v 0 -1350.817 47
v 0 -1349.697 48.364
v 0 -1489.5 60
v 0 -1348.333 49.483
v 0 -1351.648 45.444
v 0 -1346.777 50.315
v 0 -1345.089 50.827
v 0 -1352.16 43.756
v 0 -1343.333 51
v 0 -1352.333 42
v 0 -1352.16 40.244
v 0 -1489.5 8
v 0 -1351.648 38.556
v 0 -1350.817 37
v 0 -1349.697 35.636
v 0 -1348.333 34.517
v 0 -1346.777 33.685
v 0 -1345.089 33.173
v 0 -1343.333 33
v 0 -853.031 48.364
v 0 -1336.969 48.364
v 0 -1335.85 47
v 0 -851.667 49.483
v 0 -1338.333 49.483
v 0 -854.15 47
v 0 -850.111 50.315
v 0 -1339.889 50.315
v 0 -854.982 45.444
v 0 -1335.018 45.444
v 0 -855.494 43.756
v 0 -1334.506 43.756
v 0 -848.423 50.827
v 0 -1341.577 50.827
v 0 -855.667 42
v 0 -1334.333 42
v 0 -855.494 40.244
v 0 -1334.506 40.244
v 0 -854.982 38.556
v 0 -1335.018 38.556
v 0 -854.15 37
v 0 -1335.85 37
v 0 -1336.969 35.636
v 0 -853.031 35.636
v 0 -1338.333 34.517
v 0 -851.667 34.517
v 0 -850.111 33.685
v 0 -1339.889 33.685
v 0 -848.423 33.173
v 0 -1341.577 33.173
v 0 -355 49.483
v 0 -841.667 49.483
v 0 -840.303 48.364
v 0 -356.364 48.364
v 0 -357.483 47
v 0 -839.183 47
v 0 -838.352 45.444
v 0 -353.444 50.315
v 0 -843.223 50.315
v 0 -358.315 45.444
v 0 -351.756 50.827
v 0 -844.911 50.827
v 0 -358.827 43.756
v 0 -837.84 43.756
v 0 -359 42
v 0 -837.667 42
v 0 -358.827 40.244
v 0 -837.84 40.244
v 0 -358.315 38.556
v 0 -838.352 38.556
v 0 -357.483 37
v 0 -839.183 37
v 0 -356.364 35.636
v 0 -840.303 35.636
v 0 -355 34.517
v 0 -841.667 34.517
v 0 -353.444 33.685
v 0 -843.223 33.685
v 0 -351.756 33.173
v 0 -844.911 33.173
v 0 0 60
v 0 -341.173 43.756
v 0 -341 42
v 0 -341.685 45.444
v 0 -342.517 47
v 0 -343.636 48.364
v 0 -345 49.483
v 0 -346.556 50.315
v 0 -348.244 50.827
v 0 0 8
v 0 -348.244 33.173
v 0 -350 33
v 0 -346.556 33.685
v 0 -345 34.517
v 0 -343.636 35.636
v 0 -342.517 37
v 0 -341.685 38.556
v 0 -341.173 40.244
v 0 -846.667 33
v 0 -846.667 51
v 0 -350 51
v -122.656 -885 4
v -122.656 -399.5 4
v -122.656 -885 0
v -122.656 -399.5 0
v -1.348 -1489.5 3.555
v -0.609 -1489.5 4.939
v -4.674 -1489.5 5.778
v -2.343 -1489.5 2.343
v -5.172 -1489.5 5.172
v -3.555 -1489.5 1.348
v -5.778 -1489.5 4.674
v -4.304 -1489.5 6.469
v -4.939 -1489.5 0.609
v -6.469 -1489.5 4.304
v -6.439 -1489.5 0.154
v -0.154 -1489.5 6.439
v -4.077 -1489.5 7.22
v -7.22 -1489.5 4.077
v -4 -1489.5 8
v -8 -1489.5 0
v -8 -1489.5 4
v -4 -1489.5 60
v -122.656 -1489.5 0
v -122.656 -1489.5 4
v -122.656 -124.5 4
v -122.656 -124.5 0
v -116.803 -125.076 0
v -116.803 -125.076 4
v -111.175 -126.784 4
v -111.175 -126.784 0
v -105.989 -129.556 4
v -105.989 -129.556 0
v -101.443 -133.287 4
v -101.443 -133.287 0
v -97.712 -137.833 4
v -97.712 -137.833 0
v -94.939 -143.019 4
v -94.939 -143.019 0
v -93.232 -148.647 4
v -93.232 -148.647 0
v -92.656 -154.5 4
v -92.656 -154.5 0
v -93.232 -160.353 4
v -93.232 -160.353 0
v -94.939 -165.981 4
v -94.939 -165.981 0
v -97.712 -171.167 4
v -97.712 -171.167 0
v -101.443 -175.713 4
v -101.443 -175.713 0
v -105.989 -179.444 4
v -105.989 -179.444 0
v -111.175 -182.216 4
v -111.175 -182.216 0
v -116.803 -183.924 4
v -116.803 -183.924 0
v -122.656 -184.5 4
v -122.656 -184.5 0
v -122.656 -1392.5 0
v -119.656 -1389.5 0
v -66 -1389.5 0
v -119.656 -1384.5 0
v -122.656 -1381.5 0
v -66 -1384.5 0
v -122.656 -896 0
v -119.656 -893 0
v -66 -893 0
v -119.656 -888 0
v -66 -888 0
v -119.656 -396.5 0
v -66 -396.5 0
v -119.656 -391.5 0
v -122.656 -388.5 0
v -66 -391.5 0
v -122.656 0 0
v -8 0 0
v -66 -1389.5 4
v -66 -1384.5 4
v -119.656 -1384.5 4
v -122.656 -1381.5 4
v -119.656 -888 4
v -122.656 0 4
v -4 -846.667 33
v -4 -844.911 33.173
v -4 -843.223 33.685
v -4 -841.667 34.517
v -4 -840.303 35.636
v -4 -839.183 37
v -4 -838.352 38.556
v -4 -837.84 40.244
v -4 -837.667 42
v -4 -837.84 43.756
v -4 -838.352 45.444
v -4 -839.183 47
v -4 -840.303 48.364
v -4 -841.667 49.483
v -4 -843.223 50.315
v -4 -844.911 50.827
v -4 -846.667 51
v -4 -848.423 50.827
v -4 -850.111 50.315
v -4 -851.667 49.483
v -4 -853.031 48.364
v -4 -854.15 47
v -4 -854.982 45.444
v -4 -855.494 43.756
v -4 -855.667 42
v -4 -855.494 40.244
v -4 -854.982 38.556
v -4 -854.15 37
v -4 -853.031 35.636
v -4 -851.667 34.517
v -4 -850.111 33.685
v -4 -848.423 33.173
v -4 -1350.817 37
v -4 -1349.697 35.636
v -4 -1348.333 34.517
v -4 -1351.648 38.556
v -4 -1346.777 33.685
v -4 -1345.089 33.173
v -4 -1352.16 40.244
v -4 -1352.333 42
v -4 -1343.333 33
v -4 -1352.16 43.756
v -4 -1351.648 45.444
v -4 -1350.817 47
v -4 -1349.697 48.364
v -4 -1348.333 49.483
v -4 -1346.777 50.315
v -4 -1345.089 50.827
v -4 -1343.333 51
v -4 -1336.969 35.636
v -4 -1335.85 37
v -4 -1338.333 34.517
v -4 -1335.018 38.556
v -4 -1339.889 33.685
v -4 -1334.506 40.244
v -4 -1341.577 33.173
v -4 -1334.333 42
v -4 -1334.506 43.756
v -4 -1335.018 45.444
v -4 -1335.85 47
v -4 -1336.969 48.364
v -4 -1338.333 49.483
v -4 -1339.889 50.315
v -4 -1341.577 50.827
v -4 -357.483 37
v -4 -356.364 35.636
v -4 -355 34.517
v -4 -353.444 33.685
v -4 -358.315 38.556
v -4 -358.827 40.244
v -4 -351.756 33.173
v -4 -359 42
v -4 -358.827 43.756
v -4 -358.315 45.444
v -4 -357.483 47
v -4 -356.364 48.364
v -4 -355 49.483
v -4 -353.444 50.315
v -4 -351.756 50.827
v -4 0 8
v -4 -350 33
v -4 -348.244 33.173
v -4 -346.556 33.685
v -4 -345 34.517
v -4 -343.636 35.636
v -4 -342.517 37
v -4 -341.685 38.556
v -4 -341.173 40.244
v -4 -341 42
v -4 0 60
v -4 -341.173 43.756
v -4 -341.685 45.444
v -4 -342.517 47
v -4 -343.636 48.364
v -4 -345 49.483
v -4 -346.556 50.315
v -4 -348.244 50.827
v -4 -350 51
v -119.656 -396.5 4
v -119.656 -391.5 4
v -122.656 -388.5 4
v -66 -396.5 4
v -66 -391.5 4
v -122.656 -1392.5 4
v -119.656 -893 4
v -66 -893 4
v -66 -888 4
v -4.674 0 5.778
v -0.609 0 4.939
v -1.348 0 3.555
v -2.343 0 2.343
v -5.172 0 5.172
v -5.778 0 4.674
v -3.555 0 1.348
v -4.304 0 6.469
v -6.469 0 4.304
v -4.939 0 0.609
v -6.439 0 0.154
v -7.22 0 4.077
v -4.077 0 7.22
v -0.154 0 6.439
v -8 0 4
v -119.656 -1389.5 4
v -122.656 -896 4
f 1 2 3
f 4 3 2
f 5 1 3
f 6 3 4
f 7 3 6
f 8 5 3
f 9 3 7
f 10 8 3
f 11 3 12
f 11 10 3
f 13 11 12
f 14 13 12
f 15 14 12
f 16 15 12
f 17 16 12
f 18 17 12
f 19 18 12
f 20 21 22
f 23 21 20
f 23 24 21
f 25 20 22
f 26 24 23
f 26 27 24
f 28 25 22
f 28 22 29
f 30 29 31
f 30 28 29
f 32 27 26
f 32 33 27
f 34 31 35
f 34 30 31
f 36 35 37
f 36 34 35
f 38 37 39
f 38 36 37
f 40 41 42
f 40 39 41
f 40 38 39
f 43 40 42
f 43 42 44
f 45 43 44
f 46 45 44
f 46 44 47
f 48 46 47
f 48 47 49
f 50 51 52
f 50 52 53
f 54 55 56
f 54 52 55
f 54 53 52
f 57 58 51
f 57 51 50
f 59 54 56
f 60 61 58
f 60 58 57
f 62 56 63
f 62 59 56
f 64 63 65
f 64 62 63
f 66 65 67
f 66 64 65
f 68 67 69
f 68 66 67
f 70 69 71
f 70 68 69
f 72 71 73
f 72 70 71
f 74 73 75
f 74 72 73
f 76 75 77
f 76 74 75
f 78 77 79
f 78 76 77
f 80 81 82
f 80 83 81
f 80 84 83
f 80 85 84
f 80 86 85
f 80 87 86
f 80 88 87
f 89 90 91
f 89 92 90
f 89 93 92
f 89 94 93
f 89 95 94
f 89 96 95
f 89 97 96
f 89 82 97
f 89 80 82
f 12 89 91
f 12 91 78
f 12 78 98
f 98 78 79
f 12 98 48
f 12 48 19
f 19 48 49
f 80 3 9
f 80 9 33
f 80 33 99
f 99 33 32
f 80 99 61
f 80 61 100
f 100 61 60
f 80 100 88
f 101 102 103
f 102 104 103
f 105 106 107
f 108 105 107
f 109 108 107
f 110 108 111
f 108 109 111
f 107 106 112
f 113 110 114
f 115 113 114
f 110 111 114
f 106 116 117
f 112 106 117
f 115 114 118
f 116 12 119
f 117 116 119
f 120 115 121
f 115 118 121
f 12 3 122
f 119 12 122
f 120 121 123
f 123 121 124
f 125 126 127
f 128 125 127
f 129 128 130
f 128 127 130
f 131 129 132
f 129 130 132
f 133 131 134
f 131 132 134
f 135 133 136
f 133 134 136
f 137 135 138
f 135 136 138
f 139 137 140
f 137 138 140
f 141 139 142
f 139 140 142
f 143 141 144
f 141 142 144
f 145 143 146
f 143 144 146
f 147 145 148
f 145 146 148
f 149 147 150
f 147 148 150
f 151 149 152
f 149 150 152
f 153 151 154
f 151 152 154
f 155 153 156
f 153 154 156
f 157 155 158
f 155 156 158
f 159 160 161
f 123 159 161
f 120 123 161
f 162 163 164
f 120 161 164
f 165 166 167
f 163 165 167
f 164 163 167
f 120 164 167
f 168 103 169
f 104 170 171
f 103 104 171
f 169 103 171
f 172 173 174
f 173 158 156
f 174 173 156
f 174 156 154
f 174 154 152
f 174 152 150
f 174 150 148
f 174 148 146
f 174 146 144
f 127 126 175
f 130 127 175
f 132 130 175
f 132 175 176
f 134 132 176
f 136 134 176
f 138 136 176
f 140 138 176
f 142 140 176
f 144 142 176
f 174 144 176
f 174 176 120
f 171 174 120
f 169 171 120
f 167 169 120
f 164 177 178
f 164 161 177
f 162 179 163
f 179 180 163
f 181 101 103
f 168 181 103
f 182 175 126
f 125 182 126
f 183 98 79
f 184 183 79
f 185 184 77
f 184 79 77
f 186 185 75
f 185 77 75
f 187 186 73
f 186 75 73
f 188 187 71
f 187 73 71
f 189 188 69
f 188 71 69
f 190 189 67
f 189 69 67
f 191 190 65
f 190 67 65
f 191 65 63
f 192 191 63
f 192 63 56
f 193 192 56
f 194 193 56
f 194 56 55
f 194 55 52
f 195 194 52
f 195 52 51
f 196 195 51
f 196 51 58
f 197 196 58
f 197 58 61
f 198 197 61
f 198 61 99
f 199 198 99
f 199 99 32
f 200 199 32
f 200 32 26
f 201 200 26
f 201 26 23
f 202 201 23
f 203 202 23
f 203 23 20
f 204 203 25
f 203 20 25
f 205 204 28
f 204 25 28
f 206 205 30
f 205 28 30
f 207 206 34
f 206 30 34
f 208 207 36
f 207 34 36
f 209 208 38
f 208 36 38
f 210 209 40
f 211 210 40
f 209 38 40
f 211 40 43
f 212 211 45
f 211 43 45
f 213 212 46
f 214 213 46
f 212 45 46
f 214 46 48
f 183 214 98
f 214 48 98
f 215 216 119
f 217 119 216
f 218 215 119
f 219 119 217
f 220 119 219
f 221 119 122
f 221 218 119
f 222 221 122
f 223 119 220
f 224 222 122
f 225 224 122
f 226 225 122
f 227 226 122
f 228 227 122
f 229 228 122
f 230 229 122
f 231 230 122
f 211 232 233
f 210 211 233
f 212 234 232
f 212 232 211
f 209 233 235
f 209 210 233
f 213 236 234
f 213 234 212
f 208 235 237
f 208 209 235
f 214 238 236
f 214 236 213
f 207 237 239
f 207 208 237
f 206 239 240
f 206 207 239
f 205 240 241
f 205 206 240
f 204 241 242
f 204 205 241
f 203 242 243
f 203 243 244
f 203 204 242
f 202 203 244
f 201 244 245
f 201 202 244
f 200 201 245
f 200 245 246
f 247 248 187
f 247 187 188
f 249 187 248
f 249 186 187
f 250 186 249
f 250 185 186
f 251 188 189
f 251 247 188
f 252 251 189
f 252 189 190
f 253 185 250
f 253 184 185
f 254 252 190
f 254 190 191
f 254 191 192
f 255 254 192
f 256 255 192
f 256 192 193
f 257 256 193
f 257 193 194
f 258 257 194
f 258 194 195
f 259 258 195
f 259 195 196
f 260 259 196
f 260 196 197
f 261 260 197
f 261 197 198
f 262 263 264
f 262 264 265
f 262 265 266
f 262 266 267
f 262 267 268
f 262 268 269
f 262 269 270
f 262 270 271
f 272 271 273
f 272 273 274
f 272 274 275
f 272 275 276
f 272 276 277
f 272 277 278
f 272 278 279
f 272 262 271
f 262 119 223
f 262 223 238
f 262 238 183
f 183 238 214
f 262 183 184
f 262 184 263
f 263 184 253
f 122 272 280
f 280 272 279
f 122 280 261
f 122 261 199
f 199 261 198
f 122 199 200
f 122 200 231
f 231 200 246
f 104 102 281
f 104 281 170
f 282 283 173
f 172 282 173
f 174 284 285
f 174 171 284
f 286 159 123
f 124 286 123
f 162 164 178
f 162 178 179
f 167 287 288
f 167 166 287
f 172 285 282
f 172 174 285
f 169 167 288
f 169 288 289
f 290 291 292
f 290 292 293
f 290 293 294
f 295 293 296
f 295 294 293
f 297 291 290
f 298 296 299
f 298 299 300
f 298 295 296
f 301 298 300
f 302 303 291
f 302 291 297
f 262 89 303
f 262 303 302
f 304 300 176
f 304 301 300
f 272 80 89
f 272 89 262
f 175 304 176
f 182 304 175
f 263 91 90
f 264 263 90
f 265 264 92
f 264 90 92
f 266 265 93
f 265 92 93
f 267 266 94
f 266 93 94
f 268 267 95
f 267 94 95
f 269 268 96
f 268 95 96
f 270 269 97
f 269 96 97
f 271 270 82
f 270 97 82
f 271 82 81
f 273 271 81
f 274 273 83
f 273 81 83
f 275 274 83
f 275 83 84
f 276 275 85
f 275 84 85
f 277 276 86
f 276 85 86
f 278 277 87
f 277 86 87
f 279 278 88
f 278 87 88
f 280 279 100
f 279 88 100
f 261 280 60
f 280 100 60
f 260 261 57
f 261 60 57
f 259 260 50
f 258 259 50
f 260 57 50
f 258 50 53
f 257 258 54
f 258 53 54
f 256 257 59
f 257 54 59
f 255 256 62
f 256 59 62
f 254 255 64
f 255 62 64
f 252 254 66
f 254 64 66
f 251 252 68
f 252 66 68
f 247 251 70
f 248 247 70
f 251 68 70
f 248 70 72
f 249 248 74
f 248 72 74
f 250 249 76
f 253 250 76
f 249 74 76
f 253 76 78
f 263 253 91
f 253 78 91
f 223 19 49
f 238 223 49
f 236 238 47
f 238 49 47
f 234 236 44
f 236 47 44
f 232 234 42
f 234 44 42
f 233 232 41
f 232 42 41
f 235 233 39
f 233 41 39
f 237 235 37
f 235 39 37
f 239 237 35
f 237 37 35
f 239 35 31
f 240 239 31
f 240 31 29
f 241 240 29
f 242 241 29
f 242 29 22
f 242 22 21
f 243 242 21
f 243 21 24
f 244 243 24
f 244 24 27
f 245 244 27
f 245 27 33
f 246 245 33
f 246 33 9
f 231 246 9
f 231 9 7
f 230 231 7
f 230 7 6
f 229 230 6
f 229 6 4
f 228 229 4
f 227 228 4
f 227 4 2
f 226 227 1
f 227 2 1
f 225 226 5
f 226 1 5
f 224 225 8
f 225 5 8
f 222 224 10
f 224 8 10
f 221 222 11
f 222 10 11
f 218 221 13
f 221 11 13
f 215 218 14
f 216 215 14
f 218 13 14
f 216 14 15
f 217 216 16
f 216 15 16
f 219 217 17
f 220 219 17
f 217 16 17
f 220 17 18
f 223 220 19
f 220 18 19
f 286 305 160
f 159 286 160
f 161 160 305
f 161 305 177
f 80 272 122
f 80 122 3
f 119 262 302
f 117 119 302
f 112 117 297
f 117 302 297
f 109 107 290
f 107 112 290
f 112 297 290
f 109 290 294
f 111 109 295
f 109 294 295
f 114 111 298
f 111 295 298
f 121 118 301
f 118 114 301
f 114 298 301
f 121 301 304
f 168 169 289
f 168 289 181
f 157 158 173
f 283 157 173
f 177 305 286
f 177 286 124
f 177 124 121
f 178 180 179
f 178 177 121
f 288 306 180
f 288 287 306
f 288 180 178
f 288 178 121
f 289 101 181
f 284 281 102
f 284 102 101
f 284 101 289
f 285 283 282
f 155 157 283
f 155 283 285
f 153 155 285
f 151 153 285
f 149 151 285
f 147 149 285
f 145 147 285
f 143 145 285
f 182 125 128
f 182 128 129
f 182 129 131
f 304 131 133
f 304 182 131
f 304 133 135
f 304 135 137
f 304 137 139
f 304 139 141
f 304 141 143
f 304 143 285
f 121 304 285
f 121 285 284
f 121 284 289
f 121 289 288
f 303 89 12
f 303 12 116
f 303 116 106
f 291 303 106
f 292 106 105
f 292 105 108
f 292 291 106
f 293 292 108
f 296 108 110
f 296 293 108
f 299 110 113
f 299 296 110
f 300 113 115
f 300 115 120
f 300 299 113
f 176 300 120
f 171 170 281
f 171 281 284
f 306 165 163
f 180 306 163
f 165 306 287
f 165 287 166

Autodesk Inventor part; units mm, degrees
ref_plane "YZ Plane" through (0, 0, 0) normal (1, 0, 0) x (0, 1, 0)
ref_plane "XZ Plane" through (0, 0, 0) normal (0, 1, 0) x (-1, 0, 0)
ref_plane "XY Plane" through (0, 0, 0) normal (0, 0, 1) x (1, 0, 0)
sketch "Sketch1" plane through (0, 0, 0) normal (0, 0, 1) x (1, 0, 0)
  line L0 (0, 0) -> (-122.6558, 0)
  line L1 (-122.6558, 0) -> (-122.6558, -1489.5)
  line L2 (-122.6558, -1489.5) -> (0, -1489.5)
  line L3 (0, -1489.5) -> (0, 0)
  line L4 (-122.6558, -1389.5) -> (-66, -1389.5)
  line L5 (-66, -1389.5) -> (-66, -1384.5)
  line L6 (-66, -1384.5) -> (-122.6558, -1384.5)
  line L7 (-122.6558, -1384.5) -> (-122.6558, -1389.5)
  line L8 (-122.6558, -893) -> (-66, -893)
  line L9 (-66, -893) -> (-66, -888)
  line L10 (-66, -888) -> (-122.6558, -888)
  line L11 (-122.6558, -888) -> (-122.6558, -893)
  line L12 (-122.6558, -396.5) -> (-66, -396.5)
  line L13 (-66, -396.5) -> (-66, -391.5)
  line L14 (-66, -391.5) -> (-122.6558, -391.5)
  line L15 (-122.6558, -391.5) -> (-122.6558, -396.5)
  circle A0 centre (-122.6558, -154.5) radius 30
  point P0 (-122.6558, -391.5)
  point P1 (-122.6558, -124.5)
  point P2 (-122.6558, -184.5)
  dimension "d0" = 1489.5
  dimension "d1" = 122.6559
  dimension "d2" = 5
  dimension "d4" = 100
  dimension "d7" = 496.5
  dimension "d23" = 66
  dimension "d28" = 60
  dimension "d29" = 1335
extrude "Plate1" add sketch "Sketch1" along normal blind 4 contours L3 L2 L1 L4 L5 L6 L8 L9 L10 L12 L13 L14 A0 L0
sketch "Sketch2" plane through (-4, 0, 0) normal (1, 0, 0) x (0, 1, 0)
  line L0 (-1489.5, 0) -> (0, 0)
  line L1 (0, 0) -> (0, 60)
  line L2 (0, 60) -> (-1489.5, 60)
  line L3 (-1489.5, 60) -> (-1489.5, 0)
edge flange "Flange1" height 60 angle 90 thickness 4 bend radius 4 thickness toward (1, 0, 0) relief tear relief width 4 relief depth 2 edges at (0, -744.75, 4) wall of the first edge with corners at (-4, -1489.5, 0) (-4, 0, 0) (-4, 0, 60) (-4, -1489.5, 60)
bend "Bend1"
corner "Corner1"
chamfer "Corner Chamfer1" distance 3 angle 45 6 edges at (-122.6558, -1389.5, 2) (-122.6558, -1384.5, 2) (-122.6558, -893, 2) (-122.6558, -888, 2) (-122.6558, -391.5, 2) (-122.6558, -396.5, 2)
sketch "Sketch4" plane through (0, -1489.5, 60) normal (1, 0, 0) x (0, 0, -1)
  circle A0 centre (18, 1139.5) radius 9
  line L0 (0, 0) -> (0, 1489.5) projected
  circle A1 centre (18, 642.8333) radius 9
  circle A2 centre (18, 146.1667) radius 9
  point P0 (60, 1489.5)
  dimension "d30" = 18
  dimension "d31" = 18
  dimension "d32" = 350
  dimension "d35" = 496.6667
extrude "Cut1" cut sketch "Sketch4" against normal blind 4
equation "\"d0\" = Стрингер_длина"
equation "\"d1\" = стрингер_глубина_7"
equation "\"d2\" = паз_под_стрингер_толщина"
equation "\"d7\" = 0.333333 * Стрингер_длина"
equation "\"d23\" = паз_под_стрингер_глубина - Thickness"
equation "\"d28\" = 2 * радиус_выреза_под_сварку"
equation "\"d35\" = Шаг_шпангоутов"
equation "\"d40\" = Thickness"
equation "\"d12\" = Thickness"
equation "\"d13\" = BendReliefWidth"
equation "\"d14\" = BendReliefDepth"
equation "\"d15\" = MinimumRemnant"
equation "\"d16\" = TransitionRadius"
equation "\"d17\" = ребро_усилителей"
equation "\"d19\" = BendRadius"
equation "\"d20\" = CornerReliefSize"
equation "\"d21\" = GapSize"
equation "\"d22\" = JacobiRadiusSize"
equation "\"BendRadius\" = Thickness"
equation "\"BendReliefWidth\" = Thickness"
equation "\"BendReliefDepth\" = 0.5 * Thickness"
equation "\"CornerReliefSize\" = 4 * Thickness"
equation "\"MinimumRemnant\" = 2 * Thickness"
equation "\"TransitionRadius\" = BendRadius"
equation "\"JacobiRadiusSize\" = BendRadius"
equation "\"GapSize\" = Thickness"
equation "\"Стрингер_длина\" = 1489.5"
equation "\"стрингер_глубина_7\" = 122.65585"
equation "\"паз_под_стрингер_толщина\" = 5"
equation "\"паз_под_стрингер_глубина\" = 70"
equation "\"Thickness\" = 4"
equation "\"радиус_выреза_под_сварку\" = 30"
equation "\"Шаг_шпангоутов\" = 496.666667"
equation "\"ребро_усилителей\" = 60"
properties part number "GBK 0302 stringer 7" material "Steel"
